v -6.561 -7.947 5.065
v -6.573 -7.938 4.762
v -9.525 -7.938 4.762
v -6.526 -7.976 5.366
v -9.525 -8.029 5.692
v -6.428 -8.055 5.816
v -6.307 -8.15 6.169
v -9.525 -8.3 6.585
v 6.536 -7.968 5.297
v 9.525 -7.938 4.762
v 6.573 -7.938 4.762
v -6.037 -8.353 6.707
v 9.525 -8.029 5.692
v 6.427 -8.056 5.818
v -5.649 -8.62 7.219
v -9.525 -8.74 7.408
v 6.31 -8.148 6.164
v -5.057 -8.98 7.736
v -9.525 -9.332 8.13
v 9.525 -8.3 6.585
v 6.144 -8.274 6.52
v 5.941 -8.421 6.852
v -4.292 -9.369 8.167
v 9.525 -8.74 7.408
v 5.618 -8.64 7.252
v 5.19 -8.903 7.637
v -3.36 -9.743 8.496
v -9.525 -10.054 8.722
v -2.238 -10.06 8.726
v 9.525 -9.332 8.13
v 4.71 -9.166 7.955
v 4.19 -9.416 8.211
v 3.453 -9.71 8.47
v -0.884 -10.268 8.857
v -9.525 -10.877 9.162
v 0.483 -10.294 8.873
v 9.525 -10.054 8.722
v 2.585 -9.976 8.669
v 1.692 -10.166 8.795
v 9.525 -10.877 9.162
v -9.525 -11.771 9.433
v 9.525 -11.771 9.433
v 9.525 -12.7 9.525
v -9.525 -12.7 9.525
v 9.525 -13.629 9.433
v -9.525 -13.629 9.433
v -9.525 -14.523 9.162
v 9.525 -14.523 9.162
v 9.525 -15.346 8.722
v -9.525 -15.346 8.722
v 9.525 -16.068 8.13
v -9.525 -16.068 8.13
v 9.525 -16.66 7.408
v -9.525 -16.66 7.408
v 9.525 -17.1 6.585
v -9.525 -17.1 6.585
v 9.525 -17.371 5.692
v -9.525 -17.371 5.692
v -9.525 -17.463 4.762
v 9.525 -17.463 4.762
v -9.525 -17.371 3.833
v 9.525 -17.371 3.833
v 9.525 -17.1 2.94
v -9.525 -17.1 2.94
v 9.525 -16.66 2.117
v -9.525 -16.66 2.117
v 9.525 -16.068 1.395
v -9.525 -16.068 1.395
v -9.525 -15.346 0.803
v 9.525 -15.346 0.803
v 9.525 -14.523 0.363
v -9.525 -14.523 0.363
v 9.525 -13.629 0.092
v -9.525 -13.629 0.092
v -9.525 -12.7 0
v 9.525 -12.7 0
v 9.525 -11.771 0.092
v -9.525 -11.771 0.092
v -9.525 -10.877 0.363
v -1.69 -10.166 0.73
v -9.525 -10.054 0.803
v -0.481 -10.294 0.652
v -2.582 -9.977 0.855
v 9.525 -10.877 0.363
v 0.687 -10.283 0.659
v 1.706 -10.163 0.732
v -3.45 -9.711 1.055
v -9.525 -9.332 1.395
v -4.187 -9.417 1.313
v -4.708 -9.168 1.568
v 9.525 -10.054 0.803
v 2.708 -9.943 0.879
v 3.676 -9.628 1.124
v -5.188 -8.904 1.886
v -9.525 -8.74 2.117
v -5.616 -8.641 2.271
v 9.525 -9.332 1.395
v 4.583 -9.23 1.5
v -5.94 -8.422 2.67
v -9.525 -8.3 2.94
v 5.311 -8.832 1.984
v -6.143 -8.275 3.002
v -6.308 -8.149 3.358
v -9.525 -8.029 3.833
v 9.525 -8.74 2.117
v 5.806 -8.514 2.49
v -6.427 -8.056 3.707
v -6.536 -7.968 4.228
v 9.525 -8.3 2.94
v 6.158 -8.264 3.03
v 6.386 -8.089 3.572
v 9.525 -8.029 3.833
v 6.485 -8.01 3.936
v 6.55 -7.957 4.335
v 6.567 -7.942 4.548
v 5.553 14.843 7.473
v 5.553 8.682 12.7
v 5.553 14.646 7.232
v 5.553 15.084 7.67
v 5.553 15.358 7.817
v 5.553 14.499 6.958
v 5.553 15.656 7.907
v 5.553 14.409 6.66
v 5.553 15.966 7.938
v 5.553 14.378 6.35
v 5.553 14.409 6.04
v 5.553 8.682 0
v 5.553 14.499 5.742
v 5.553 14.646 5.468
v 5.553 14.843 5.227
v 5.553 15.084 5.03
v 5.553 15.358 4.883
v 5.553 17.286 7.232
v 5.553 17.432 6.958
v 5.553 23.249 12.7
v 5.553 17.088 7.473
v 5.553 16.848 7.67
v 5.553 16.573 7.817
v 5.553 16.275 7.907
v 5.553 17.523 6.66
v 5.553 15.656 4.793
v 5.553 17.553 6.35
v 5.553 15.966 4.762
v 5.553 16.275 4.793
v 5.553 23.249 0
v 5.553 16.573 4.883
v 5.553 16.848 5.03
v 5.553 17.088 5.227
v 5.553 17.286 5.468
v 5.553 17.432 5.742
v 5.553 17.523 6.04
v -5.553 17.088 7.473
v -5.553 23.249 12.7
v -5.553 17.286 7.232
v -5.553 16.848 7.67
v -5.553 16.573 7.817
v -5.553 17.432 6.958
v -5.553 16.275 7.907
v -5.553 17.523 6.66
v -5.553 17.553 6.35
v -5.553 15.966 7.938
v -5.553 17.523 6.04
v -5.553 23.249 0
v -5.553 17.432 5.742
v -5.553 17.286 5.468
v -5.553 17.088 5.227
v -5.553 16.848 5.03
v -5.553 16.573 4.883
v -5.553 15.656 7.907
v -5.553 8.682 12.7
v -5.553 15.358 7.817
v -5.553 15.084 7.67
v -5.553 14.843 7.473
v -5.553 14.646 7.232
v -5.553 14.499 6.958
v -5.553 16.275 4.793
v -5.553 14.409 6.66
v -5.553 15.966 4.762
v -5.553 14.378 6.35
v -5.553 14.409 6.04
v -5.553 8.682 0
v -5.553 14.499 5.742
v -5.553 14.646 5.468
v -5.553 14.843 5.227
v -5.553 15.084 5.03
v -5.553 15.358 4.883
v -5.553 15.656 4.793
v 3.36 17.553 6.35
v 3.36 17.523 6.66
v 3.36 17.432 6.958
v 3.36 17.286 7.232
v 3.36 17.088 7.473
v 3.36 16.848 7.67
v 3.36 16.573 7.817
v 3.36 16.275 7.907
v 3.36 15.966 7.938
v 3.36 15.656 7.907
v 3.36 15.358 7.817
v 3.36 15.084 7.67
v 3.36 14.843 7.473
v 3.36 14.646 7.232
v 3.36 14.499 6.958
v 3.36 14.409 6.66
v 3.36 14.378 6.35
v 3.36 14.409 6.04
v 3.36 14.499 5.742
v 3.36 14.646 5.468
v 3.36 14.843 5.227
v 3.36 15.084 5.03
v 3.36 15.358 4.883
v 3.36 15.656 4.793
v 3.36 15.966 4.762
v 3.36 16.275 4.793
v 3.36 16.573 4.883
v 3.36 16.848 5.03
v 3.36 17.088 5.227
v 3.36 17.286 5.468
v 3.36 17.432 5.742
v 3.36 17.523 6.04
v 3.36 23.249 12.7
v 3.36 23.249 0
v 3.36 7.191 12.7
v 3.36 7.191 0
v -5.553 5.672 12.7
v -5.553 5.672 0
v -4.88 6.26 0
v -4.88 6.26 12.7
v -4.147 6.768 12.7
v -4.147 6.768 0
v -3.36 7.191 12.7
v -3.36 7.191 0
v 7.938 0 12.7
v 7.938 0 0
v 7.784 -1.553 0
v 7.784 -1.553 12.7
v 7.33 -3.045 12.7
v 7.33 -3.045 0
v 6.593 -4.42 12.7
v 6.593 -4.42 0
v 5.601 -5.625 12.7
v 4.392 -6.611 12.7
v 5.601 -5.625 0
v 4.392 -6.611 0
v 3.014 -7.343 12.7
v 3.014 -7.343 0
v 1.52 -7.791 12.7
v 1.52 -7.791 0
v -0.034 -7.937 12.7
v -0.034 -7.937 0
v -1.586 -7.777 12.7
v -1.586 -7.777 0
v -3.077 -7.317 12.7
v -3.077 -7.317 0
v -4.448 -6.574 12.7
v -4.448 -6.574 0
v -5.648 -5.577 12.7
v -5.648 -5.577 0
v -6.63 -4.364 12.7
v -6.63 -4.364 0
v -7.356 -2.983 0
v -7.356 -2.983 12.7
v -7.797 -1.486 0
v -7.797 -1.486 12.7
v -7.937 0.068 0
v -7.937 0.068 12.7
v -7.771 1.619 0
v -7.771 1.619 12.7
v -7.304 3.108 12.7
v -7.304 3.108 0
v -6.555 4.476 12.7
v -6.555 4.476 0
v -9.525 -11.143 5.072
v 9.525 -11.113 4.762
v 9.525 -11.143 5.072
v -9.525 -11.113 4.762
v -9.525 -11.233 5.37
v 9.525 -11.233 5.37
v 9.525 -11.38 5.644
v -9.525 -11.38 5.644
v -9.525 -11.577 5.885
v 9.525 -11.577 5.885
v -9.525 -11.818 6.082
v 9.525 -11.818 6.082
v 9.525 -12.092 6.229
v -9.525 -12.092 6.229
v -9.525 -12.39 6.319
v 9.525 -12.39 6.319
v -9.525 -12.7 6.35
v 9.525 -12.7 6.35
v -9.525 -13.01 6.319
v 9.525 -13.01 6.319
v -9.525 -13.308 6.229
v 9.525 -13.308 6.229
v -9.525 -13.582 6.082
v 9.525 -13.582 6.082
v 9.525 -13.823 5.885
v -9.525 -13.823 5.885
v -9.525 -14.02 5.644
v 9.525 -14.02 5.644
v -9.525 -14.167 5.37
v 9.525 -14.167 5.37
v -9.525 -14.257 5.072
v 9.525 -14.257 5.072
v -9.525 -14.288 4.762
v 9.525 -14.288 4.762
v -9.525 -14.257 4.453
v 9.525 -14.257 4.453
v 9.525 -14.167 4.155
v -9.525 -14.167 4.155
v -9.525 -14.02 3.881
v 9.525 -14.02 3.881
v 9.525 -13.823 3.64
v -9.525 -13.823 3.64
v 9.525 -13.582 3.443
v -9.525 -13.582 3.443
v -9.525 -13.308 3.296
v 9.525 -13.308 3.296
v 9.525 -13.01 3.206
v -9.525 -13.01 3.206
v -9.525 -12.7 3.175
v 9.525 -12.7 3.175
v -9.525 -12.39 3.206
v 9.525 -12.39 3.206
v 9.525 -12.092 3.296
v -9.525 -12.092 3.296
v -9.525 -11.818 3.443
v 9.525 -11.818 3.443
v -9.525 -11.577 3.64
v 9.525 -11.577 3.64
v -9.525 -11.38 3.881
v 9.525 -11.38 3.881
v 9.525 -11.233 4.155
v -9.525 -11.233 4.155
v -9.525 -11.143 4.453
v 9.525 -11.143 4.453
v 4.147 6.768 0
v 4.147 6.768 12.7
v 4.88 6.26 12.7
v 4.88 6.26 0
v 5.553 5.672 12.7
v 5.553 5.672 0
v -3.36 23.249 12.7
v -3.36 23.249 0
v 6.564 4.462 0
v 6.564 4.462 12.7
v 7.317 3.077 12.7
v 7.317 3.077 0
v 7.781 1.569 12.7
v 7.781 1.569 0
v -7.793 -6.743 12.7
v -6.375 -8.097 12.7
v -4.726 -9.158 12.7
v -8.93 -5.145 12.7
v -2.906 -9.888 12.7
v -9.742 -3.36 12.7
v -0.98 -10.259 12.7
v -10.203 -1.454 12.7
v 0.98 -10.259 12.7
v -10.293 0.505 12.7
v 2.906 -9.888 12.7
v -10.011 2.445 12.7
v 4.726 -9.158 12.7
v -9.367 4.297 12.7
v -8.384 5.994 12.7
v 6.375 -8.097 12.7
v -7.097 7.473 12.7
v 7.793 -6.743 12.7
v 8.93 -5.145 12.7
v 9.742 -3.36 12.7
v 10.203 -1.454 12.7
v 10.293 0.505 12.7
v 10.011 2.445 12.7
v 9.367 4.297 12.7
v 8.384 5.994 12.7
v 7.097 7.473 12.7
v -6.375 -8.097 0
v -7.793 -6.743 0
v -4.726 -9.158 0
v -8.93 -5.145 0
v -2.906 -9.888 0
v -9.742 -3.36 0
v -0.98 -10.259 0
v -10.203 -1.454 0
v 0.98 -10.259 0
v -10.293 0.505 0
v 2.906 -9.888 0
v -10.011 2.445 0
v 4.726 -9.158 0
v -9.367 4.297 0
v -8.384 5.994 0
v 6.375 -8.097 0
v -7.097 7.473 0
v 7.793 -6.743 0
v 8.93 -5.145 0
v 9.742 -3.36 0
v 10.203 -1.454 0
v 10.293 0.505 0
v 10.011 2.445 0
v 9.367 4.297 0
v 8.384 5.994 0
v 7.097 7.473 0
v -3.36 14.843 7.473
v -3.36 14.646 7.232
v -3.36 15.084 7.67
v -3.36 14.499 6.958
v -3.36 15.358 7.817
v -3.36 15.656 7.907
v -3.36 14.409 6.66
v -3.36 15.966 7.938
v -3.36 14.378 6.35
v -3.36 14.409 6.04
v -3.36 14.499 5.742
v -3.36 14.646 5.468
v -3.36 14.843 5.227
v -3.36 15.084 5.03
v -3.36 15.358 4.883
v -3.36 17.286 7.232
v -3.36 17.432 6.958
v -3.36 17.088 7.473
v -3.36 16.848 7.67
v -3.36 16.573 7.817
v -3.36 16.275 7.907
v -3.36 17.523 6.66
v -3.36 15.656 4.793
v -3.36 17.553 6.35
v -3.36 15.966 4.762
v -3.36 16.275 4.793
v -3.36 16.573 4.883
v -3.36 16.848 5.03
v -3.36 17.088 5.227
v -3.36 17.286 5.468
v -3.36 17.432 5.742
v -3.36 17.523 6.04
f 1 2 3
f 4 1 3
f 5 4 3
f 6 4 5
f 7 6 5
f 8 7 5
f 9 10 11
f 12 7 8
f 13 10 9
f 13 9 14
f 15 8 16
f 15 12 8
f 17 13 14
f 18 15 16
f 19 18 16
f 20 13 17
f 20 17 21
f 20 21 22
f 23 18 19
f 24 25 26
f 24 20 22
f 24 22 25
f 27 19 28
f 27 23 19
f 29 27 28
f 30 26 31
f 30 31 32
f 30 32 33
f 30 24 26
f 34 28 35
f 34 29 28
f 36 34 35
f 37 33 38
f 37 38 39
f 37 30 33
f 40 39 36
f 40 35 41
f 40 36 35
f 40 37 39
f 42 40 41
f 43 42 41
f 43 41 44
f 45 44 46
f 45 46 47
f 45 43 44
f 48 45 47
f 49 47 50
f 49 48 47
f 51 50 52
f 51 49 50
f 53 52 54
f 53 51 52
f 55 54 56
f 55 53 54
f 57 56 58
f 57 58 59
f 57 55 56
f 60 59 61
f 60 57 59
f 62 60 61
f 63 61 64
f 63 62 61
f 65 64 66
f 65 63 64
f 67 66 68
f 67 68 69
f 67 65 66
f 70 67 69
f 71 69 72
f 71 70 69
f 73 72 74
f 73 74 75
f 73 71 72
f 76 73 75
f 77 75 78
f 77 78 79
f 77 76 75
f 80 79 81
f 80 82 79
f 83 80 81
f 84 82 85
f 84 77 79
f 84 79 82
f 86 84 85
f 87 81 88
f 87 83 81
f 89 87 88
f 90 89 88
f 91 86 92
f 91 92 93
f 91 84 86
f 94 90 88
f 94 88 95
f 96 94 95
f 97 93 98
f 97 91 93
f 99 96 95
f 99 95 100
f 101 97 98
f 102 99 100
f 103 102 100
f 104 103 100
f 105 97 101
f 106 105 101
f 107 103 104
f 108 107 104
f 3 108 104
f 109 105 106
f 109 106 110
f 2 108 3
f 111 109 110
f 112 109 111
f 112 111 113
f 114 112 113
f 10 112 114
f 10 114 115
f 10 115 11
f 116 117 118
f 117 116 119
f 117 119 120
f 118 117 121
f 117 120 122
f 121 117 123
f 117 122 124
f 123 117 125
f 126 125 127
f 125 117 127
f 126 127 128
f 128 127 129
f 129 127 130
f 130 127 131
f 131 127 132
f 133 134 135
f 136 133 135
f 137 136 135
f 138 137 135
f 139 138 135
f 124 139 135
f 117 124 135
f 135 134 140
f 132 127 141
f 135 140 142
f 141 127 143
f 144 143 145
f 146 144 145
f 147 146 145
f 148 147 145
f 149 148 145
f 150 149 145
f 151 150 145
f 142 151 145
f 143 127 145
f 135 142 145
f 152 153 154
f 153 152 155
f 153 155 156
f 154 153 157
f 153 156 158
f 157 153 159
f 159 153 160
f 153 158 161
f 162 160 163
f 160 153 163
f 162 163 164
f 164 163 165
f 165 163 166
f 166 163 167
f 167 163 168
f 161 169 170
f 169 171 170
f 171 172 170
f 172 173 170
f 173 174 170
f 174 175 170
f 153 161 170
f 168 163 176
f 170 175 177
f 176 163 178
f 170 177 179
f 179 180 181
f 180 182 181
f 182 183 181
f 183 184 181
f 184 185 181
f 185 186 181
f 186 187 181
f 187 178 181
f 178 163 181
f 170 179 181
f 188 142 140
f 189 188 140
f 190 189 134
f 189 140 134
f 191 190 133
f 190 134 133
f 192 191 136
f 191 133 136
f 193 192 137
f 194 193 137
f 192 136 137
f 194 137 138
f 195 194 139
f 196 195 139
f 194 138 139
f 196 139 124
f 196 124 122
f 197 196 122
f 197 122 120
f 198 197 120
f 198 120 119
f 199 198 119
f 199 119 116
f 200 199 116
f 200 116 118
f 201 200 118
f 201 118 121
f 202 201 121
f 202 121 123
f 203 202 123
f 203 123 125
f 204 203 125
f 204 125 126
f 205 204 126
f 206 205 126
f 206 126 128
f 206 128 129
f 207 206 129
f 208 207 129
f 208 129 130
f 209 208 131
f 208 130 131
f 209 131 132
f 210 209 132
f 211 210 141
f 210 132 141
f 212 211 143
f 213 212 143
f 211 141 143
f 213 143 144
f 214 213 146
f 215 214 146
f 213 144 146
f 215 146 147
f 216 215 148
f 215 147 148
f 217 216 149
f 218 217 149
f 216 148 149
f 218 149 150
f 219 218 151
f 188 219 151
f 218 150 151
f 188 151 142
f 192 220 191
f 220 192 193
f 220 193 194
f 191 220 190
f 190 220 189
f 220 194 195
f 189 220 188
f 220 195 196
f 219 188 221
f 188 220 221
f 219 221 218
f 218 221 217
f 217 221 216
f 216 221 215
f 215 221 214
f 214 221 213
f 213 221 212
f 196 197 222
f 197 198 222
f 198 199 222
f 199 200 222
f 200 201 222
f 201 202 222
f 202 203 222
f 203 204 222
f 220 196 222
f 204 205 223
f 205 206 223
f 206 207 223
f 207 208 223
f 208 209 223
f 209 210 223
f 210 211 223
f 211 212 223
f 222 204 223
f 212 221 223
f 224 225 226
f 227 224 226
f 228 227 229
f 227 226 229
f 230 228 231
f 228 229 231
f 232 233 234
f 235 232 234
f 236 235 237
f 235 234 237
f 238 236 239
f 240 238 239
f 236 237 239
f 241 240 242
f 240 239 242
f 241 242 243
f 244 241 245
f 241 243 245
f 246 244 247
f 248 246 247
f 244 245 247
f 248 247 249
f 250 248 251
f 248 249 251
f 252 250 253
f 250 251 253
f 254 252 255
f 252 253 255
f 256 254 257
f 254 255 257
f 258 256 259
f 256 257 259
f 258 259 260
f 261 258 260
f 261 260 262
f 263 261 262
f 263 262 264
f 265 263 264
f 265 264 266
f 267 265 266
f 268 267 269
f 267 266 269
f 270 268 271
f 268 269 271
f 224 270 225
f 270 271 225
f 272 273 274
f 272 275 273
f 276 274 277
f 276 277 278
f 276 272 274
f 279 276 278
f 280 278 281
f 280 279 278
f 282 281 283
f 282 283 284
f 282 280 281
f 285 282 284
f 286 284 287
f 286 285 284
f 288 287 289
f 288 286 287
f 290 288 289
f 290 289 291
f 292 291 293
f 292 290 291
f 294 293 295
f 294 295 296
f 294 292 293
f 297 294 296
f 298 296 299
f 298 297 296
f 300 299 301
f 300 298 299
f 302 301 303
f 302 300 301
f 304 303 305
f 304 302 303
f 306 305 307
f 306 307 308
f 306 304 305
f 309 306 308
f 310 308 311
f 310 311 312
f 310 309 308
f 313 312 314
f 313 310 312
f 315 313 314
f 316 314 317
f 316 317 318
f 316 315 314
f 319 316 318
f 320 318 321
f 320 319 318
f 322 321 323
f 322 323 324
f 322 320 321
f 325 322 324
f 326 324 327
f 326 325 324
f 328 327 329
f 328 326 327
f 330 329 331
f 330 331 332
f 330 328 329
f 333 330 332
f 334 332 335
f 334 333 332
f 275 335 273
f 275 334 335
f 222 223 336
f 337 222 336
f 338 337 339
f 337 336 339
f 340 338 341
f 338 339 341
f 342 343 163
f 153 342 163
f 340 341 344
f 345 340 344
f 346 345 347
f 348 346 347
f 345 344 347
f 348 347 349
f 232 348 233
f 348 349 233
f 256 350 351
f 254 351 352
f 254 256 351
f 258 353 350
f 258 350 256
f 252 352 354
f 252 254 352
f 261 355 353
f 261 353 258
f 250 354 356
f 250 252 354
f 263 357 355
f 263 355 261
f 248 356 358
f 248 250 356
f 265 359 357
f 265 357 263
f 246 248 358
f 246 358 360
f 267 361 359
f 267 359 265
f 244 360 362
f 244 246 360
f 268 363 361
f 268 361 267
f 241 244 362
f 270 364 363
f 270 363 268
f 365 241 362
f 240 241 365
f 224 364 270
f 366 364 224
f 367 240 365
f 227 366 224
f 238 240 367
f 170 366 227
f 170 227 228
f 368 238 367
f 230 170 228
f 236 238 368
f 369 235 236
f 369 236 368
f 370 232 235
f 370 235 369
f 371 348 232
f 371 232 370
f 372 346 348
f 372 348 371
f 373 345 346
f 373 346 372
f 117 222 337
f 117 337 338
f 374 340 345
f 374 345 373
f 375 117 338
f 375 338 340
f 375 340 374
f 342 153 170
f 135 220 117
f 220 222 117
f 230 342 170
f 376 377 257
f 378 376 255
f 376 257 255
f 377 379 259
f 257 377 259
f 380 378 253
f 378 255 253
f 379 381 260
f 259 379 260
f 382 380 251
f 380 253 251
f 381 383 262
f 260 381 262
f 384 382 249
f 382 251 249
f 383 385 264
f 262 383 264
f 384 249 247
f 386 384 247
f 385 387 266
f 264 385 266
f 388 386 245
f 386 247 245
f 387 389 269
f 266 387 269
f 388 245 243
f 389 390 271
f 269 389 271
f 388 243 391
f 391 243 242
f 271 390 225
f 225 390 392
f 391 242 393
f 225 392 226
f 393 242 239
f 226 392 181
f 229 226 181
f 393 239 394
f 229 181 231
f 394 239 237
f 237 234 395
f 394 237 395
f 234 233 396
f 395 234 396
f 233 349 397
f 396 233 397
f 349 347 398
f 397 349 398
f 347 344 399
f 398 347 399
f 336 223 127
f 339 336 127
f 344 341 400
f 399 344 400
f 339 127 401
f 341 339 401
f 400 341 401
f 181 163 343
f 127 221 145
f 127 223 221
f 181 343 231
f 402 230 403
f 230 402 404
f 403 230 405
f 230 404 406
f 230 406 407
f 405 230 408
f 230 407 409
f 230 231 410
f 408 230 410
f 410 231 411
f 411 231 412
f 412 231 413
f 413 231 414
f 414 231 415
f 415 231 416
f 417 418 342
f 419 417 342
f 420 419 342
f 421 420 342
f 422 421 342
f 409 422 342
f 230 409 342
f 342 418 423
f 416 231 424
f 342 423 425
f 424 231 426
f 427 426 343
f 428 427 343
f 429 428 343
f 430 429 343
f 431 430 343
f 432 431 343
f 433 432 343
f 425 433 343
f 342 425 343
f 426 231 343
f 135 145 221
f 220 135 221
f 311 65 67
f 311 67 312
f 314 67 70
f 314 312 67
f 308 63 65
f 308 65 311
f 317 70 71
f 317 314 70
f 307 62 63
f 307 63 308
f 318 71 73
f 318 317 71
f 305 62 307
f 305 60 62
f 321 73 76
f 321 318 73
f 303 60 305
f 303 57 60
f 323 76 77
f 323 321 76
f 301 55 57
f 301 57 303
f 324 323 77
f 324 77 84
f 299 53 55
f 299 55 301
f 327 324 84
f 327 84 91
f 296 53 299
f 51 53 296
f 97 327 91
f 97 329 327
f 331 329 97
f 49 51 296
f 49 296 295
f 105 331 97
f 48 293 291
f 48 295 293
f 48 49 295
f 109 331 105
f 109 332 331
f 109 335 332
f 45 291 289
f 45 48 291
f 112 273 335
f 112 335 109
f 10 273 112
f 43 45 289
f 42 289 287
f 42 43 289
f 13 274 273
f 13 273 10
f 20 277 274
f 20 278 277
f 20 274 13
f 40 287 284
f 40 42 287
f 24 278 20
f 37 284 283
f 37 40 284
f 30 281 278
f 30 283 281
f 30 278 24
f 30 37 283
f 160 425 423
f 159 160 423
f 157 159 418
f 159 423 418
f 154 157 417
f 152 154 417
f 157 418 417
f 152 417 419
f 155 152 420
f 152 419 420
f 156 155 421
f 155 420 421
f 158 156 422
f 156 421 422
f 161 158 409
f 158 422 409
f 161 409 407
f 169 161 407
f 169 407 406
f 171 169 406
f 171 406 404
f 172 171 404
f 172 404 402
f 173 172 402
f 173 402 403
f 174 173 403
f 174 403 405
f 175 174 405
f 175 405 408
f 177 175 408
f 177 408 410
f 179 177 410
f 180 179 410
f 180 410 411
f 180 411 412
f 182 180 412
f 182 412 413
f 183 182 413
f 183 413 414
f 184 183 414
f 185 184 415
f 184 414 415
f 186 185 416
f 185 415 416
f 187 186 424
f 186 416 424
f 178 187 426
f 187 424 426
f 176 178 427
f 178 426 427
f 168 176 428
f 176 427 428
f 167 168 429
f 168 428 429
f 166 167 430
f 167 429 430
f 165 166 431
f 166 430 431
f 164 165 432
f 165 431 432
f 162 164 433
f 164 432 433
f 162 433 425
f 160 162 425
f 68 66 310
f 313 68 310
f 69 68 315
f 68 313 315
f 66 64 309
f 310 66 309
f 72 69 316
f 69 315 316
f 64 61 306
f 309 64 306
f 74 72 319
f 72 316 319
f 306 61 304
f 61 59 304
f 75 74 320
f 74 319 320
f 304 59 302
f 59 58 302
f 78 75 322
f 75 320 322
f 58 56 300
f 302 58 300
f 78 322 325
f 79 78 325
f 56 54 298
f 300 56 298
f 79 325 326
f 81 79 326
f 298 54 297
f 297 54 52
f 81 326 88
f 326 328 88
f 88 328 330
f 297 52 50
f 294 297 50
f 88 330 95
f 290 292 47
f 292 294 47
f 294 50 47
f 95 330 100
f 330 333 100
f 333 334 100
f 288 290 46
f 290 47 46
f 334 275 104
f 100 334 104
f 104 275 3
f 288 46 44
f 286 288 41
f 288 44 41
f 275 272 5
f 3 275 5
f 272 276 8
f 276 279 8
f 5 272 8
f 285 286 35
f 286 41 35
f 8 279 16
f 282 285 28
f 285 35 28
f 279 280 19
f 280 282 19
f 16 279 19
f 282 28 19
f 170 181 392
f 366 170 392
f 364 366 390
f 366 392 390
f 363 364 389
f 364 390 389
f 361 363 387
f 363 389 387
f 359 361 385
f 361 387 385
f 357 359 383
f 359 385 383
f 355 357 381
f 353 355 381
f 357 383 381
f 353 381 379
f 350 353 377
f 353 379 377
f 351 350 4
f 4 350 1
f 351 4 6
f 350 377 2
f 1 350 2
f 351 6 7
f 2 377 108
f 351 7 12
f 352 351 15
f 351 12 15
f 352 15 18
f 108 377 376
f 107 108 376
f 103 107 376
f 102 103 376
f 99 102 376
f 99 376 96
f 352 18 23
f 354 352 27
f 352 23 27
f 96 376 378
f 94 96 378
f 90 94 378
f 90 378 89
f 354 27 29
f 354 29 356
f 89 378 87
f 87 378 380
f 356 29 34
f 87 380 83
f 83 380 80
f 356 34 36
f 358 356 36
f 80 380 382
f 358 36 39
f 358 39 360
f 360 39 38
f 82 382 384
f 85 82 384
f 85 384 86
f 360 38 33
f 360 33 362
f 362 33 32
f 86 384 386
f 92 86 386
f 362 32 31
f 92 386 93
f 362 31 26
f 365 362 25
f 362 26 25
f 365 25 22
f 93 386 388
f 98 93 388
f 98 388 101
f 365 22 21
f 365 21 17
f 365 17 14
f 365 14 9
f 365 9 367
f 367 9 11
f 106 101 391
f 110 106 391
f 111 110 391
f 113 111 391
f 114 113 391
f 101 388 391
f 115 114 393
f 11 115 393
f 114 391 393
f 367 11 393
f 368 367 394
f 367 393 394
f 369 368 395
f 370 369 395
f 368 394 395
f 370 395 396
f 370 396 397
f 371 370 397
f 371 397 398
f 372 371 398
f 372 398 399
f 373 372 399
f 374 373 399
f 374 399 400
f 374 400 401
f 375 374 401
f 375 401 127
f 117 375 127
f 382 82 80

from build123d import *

# Parameters (mm, degrees)
F2_DEPTH = 12.7
F1_R     = 4.7625
F1_R_2   = 1.5875
F3_DEPTH = 9.525
F4_R     = 1.5875
F5_DEPTH = 15.859309


with BuildPart() as f2:
    # F0 (on Top) → F2 (new body)
    with BuildSketch(Plane.XY):
        with BuildLine():
            Line((-5.552635, 5.67205), (-5.552635, 8.681886))
            ThreePointArc((-5.552635, 8.681886), (0, -10.305673), (5.552635, 8.681886))
            Line((5.552635, 8.681886), (5.552635, 5.67205))
            ThreePointArc((5.552635, 5.67205), (7.317033, 3.076513), (7.9375, 0))
            ThreePointArc((7.9375, 0), (-3.076513, -7.317033), (-5.552635, 5.67205))
        make_face()
        with BuildLine():
            Line((-5.552635, 23.249359), (-5.552635, 8.681886))
            Line((-5.552635, 8.681886), (-5.552635, 5.67205))
            ThreePointArc((-5.552635, 5.67205), (-4.520661, 6.52438), (-3.360147, 7.191197))
            Line((-3.360147, 7.191197), (-3.360147, 23.249359))
            Line((-3.360147, 23.249359), (-5.552635, 23.249359))
        make_face()
        with BuildLine():
            Line((5.552635, 5.67205), (5.552635, 8.681886))
            Line((5.552635, 8.681886), (5.552635, 23.249359))
            Line((5.552635, 23.249359), (3.360147, 23.249359))
            Line((3.360147, 23.249359), (3.360147, 7.191197))
            ThreePointArc((3.360147, 7.191197), (4.520661, 6.52438), (5.552635, 5.67205))
        make_face()
    extrude(amount=F2_DEPTH)

    # F1 (on Right) → F3 (join, symmetric)
    with BuildSketch(Plane.YZ):
        with Locations((-12.700004, 4.7625)):
            Circle(F1_R)
        with Locations((-12.700004, 4.7625)):
            Circle(F1_R_2, mode=Mode.SUBTRACT)
    extrude(amount=F3_DEPTH, both=True)

    # F4 (on face) → F5 (cut, through all)
    with BuildSketch(Plane.YZ.offset(5.552635)):
        with Locations((15.965623, 6.35)):
            Circle(F4_R)
    extrude(amount=-F5_DEPTH, mode=Mode.SUBTRACT)


with BuildPart() as f6_1:
    # F6: copy of F2
    add(f2.part)


solid = f2.part
